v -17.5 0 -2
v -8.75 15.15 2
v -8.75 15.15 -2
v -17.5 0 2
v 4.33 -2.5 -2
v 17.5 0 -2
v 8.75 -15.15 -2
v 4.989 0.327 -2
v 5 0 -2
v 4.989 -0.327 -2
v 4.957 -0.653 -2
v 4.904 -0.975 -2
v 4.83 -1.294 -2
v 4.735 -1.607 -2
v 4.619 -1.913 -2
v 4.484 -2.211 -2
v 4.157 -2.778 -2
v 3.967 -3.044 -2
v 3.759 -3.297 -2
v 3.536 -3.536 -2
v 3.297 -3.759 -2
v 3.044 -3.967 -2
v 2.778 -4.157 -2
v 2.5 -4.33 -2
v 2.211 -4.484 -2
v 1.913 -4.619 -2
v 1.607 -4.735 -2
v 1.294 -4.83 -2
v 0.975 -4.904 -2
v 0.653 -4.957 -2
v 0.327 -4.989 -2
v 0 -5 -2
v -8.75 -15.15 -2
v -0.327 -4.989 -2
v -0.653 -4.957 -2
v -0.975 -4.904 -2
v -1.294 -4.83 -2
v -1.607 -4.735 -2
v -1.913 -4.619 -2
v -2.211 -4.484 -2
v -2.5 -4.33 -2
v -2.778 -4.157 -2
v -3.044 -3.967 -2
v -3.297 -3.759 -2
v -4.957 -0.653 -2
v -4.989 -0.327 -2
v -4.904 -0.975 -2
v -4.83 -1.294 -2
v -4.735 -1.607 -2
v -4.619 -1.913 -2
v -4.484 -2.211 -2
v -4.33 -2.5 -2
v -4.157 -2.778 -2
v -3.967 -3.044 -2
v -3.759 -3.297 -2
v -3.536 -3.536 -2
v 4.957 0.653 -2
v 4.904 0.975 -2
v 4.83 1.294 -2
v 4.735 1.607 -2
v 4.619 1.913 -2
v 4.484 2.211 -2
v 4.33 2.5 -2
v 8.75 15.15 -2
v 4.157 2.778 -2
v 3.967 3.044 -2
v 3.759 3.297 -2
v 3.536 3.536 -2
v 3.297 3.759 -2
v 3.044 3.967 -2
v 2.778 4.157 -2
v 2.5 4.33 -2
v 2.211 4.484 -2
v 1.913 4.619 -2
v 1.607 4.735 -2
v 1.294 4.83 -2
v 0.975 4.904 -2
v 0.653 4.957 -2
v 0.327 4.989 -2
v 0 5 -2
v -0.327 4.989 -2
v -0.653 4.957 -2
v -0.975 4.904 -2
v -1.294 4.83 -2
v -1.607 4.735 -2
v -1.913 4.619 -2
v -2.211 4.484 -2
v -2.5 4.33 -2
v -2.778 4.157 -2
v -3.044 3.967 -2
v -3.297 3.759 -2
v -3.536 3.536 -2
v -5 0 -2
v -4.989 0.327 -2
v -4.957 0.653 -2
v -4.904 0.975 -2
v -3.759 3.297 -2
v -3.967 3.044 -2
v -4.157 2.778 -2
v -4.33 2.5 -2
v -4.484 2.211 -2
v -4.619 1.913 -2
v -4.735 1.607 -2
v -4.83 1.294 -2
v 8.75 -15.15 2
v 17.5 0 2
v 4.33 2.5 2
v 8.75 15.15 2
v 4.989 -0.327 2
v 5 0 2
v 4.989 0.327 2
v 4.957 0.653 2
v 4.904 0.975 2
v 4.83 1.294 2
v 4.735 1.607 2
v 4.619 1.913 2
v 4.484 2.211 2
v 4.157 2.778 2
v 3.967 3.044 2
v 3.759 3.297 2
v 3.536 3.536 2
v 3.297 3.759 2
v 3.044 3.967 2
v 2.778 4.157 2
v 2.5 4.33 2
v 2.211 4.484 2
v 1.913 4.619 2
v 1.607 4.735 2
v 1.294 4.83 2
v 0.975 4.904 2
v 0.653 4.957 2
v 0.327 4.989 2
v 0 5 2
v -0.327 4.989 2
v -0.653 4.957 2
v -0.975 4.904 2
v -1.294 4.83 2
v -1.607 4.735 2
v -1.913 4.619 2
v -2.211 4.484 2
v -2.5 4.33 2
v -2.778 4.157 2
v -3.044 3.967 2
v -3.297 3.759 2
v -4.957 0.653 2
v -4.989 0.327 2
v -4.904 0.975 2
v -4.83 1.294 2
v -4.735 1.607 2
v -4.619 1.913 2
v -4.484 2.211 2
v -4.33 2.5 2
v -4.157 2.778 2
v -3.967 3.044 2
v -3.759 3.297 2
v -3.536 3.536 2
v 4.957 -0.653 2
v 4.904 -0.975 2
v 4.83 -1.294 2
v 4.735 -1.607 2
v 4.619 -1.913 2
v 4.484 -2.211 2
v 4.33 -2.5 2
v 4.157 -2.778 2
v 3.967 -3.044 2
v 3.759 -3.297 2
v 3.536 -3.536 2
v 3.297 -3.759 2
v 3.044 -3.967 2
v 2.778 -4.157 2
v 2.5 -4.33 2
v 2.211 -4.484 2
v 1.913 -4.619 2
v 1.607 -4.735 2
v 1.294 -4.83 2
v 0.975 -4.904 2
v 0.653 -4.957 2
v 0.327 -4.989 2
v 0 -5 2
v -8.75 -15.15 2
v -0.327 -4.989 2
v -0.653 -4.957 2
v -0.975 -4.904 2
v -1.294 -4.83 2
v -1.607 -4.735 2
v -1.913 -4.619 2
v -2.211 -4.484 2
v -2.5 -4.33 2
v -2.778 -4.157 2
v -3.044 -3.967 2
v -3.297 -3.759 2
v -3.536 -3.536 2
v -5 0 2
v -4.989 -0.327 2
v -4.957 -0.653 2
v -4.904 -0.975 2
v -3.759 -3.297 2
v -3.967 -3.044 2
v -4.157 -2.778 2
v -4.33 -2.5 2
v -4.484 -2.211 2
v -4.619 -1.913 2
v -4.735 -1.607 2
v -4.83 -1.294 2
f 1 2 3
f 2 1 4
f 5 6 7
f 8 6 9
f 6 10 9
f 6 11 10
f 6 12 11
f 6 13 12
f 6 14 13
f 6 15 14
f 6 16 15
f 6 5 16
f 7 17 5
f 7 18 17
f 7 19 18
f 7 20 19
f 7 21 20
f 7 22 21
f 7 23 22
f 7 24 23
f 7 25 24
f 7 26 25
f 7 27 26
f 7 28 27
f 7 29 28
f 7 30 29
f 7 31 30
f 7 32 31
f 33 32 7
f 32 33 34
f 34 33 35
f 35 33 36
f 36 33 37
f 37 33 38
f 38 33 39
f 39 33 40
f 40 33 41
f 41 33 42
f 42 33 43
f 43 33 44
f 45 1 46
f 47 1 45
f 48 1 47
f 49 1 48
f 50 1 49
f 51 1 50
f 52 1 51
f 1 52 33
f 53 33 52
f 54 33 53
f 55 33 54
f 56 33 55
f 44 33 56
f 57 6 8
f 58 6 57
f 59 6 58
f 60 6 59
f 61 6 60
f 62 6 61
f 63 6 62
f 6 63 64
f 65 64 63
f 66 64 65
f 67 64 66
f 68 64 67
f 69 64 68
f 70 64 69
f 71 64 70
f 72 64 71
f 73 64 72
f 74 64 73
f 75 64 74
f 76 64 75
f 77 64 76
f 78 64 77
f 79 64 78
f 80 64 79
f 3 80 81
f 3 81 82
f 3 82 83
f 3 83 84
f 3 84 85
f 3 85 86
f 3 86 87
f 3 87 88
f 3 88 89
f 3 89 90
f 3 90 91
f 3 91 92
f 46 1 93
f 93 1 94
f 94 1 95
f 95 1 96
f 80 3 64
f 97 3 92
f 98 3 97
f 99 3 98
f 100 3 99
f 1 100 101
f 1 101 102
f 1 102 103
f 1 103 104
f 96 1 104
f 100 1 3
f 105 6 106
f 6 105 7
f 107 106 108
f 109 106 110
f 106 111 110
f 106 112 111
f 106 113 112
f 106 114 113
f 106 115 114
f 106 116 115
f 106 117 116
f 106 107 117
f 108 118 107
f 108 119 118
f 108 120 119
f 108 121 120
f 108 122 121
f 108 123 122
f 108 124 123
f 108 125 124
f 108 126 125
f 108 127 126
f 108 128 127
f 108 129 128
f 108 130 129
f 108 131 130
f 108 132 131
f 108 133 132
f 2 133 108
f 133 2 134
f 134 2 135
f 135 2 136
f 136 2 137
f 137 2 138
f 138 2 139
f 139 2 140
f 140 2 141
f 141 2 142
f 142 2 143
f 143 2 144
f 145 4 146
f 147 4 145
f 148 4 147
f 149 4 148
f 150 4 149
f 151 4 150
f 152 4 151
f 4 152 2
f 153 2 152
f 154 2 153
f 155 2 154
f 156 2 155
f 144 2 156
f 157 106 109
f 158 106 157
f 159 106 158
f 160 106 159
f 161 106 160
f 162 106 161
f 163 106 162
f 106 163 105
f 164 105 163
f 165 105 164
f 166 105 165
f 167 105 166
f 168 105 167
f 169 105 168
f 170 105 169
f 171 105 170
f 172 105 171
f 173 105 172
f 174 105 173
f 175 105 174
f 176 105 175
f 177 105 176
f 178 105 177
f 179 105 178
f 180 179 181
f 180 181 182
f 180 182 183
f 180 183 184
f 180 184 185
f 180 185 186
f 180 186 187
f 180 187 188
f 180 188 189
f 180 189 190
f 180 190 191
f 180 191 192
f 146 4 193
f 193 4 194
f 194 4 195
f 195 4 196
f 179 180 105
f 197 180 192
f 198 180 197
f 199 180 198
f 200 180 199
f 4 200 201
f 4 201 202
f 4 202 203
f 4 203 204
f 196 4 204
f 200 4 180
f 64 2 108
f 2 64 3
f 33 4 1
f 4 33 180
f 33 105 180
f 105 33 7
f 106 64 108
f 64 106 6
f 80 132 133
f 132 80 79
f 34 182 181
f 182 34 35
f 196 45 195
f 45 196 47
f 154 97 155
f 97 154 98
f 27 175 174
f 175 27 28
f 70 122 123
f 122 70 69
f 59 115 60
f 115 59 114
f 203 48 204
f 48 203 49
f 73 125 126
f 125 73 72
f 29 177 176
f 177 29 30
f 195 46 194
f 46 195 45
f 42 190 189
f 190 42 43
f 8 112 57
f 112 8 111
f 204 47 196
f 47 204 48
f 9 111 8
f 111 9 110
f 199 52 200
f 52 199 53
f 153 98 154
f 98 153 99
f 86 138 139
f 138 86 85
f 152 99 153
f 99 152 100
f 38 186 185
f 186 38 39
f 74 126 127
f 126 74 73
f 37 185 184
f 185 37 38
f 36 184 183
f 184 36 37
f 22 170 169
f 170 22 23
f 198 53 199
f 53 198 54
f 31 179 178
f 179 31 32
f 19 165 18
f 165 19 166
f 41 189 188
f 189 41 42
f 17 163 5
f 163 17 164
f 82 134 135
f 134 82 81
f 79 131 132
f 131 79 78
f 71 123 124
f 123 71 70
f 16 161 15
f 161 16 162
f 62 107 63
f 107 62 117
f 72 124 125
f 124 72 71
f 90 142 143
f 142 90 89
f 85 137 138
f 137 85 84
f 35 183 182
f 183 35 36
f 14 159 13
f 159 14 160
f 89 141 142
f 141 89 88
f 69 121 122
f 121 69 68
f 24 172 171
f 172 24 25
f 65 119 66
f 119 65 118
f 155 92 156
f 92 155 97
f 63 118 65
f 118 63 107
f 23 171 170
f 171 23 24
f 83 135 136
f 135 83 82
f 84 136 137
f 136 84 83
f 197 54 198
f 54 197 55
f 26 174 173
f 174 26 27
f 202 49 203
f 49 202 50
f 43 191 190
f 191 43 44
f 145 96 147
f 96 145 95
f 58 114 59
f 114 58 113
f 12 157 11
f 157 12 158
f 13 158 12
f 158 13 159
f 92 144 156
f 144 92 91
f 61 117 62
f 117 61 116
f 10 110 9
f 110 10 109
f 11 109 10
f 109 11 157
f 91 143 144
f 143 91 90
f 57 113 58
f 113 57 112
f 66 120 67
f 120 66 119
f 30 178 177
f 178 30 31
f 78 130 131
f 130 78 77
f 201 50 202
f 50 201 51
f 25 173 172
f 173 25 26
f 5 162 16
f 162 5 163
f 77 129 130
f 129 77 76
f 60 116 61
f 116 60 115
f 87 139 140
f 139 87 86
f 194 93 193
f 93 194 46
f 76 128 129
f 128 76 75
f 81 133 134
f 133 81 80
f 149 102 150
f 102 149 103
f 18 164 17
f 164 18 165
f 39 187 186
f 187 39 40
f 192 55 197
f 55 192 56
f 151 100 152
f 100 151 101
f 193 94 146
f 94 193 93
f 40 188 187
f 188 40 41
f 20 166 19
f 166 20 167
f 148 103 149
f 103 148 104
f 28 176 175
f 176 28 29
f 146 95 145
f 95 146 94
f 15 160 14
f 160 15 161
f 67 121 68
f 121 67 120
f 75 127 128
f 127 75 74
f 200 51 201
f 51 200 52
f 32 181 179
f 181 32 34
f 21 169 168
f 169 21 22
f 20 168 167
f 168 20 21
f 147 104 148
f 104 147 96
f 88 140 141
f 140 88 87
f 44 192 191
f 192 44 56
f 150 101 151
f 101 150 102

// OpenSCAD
$fn=96;

plate_x = 35.0;
plate_y = 30.3;
plate_z = 4.0;

hole_d = 10.0;

boss_d = 16.0;
boss_h = 1.0;

module hex2d_flat_w(width_x, width_y){
    s = width_x/2;
    r = width_y/sqrt(3);
    polygon(points=[
        [ s, 0],
        [ s/2,  r*sqrt(3)/2],
        [-s/2,  r*sqrt(3)/2],
        [-s, 0],
        [-s/2, -r*sqrt(3)/2],
        [ s/2, -r*sqrt(3)/2]
    ]);
}

module hex_plate(){
    linear_extrude(height=plate_z, center=true)
        hex2d_flat_w(plate_x, plate_y);
}

module boss_pad(){
    translate([0,0,plate_z/2 - boss_h/2])
        cylinder(h=boss_h, d=boss_d, center=true);
}

difference(){
    union(){
        hex_plate();
        boss_pad();
    }
    cylinder(h=plate_z + boss_h + 2, d=hole_d, center=true);
}
